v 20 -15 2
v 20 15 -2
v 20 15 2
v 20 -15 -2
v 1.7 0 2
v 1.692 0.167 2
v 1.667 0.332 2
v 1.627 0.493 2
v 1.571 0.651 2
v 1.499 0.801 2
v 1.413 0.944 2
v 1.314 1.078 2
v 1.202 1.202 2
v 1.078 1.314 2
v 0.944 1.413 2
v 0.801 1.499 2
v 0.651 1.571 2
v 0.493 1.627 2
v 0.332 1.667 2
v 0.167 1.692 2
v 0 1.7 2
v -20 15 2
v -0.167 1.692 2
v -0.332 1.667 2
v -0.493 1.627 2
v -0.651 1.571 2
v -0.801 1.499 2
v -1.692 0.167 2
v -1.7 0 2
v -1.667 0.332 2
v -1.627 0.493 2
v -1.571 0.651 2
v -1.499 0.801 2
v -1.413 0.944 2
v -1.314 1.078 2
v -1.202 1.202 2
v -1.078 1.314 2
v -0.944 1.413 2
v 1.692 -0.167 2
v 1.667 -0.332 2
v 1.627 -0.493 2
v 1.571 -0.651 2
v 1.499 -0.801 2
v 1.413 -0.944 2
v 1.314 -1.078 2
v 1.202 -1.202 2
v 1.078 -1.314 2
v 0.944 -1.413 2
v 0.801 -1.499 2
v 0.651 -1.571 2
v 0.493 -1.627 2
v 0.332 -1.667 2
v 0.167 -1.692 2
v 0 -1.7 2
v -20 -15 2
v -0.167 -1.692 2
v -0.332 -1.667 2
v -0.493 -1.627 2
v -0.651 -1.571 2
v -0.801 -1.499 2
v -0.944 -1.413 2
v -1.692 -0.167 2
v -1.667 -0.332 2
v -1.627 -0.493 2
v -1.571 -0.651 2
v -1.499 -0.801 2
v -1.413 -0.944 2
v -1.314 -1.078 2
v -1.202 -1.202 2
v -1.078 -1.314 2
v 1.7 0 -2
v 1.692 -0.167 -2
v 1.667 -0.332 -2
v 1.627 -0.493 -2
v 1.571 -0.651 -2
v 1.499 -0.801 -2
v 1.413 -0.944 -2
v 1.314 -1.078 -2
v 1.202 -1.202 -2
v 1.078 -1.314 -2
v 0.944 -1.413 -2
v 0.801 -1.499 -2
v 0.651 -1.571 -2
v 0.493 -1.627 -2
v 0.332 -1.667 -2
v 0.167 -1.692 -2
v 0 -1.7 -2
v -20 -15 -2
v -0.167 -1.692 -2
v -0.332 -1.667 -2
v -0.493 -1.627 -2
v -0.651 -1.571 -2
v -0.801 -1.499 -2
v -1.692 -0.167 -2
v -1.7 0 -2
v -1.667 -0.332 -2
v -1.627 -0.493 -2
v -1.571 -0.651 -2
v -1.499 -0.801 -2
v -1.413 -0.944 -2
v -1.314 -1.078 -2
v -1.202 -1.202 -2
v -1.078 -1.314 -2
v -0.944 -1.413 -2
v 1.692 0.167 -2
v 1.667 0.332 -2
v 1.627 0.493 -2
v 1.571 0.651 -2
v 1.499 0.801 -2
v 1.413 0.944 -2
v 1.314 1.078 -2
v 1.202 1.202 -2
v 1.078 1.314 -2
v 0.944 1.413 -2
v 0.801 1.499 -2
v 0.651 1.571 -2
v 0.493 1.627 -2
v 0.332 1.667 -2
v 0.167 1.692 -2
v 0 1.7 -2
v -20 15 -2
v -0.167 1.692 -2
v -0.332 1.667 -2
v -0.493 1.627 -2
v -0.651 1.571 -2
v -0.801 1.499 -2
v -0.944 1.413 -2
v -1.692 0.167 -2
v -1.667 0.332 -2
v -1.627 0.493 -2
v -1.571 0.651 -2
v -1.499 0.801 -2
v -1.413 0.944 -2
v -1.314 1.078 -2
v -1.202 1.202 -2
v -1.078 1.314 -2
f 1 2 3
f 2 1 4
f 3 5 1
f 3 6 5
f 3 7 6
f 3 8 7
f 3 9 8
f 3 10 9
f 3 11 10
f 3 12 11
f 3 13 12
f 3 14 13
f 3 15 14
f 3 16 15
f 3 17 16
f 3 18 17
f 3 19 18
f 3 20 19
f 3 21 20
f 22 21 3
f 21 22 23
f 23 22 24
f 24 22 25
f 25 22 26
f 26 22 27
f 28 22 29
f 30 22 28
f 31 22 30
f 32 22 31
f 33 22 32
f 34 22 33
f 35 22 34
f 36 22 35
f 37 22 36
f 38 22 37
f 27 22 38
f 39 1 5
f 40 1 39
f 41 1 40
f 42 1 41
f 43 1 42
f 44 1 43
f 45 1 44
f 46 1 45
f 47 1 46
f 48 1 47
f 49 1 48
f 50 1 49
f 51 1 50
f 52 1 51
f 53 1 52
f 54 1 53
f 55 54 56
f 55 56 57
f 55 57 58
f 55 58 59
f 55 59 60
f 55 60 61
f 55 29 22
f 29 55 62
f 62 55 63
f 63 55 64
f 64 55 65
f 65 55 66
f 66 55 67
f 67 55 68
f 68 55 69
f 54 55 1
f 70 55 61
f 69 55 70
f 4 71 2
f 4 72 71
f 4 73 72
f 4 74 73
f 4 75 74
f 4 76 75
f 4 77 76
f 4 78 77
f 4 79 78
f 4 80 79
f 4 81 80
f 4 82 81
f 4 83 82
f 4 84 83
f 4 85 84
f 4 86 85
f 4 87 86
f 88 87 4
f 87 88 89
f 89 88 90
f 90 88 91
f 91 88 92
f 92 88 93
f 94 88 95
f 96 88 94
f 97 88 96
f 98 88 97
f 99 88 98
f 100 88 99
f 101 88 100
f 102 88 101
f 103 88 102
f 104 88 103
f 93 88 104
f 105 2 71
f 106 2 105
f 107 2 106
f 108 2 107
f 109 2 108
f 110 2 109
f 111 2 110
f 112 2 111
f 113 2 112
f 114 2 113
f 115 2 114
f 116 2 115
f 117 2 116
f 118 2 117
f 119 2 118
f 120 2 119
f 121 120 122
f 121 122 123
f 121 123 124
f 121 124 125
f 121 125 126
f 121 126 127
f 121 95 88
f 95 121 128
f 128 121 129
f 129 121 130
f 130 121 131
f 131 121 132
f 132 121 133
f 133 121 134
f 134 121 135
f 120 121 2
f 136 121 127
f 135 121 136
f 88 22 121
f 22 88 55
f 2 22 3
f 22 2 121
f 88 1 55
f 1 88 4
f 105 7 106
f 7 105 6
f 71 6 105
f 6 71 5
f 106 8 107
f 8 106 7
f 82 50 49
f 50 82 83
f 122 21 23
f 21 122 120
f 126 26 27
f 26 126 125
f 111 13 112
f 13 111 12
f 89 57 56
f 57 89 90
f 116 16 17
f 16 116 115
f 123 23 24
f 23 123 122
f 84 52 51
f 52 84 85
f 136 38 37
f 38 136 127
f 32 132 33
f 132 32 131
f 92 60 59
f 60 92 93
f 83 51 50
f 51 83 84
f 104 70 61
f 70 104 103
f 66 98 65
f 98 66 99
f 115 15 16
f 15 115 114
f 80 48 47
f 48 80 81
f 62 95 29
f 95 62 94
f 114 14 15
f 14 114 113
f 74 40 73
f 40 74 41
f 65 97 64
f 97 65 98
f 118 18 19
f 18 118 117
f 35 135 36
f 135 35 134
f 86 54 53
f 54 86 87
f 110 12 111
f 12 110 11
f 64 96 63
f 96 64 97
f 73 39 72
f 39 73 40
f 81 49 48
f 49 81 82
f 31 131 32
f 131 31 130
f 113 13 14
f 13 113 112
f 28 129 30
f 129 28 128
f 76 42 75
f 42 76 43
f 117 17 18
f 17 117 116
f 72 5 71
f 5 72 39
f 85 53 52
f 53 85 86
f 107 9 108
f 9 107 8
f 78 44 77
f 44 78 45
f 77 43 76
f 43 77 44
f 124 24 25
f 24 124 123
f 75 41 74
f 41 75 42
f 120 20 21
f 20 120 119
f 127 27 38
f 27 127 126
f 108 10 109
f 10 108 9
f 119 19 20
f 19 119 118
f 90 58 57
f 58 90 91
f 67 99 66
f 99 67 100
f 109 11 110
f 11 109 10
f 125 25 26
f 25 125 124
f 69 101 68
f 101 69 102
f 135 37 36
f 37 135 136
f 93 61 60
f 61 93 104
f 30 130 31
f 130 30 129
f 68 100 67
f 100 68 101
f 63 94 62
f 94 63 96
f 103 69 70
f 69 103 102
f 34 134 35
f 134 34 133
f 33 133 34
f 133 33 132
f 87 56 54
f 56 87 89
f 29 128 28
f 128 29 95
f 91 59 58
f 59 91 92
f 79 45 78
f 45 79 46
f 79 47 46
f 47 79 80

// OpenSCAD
render_fn = 64;
$fn = render_fn;
set = "__CLAW_MODEL__"; // [__CLAW_MODEL__, assembly]

part_w = 40;
part_d = 30;
part_h = 4;
boolean_overlap = 0.1;

module __CLAW_MODEL___positive() {
    cube([part_w, part_d, part_h], center = true);
}

module __CLAW_MODEL___negative() {
    echo("BOM", "M3x16 screw", 1);
    cylinder(d = 3.4, h = part_h + 2 * boolean_overlap, center = true);
}

module __CLAW_MODEL__() {
    difference() {
        __CLAW_MODEL___positive();
        __CLAW_MODEL___negative();
    }
}

if (set == "__CLAW_MODEL__") {
    __CLAW_MODEL__();
} else if (set == "assembly") {
    __CLAW_MODEL__();
}
